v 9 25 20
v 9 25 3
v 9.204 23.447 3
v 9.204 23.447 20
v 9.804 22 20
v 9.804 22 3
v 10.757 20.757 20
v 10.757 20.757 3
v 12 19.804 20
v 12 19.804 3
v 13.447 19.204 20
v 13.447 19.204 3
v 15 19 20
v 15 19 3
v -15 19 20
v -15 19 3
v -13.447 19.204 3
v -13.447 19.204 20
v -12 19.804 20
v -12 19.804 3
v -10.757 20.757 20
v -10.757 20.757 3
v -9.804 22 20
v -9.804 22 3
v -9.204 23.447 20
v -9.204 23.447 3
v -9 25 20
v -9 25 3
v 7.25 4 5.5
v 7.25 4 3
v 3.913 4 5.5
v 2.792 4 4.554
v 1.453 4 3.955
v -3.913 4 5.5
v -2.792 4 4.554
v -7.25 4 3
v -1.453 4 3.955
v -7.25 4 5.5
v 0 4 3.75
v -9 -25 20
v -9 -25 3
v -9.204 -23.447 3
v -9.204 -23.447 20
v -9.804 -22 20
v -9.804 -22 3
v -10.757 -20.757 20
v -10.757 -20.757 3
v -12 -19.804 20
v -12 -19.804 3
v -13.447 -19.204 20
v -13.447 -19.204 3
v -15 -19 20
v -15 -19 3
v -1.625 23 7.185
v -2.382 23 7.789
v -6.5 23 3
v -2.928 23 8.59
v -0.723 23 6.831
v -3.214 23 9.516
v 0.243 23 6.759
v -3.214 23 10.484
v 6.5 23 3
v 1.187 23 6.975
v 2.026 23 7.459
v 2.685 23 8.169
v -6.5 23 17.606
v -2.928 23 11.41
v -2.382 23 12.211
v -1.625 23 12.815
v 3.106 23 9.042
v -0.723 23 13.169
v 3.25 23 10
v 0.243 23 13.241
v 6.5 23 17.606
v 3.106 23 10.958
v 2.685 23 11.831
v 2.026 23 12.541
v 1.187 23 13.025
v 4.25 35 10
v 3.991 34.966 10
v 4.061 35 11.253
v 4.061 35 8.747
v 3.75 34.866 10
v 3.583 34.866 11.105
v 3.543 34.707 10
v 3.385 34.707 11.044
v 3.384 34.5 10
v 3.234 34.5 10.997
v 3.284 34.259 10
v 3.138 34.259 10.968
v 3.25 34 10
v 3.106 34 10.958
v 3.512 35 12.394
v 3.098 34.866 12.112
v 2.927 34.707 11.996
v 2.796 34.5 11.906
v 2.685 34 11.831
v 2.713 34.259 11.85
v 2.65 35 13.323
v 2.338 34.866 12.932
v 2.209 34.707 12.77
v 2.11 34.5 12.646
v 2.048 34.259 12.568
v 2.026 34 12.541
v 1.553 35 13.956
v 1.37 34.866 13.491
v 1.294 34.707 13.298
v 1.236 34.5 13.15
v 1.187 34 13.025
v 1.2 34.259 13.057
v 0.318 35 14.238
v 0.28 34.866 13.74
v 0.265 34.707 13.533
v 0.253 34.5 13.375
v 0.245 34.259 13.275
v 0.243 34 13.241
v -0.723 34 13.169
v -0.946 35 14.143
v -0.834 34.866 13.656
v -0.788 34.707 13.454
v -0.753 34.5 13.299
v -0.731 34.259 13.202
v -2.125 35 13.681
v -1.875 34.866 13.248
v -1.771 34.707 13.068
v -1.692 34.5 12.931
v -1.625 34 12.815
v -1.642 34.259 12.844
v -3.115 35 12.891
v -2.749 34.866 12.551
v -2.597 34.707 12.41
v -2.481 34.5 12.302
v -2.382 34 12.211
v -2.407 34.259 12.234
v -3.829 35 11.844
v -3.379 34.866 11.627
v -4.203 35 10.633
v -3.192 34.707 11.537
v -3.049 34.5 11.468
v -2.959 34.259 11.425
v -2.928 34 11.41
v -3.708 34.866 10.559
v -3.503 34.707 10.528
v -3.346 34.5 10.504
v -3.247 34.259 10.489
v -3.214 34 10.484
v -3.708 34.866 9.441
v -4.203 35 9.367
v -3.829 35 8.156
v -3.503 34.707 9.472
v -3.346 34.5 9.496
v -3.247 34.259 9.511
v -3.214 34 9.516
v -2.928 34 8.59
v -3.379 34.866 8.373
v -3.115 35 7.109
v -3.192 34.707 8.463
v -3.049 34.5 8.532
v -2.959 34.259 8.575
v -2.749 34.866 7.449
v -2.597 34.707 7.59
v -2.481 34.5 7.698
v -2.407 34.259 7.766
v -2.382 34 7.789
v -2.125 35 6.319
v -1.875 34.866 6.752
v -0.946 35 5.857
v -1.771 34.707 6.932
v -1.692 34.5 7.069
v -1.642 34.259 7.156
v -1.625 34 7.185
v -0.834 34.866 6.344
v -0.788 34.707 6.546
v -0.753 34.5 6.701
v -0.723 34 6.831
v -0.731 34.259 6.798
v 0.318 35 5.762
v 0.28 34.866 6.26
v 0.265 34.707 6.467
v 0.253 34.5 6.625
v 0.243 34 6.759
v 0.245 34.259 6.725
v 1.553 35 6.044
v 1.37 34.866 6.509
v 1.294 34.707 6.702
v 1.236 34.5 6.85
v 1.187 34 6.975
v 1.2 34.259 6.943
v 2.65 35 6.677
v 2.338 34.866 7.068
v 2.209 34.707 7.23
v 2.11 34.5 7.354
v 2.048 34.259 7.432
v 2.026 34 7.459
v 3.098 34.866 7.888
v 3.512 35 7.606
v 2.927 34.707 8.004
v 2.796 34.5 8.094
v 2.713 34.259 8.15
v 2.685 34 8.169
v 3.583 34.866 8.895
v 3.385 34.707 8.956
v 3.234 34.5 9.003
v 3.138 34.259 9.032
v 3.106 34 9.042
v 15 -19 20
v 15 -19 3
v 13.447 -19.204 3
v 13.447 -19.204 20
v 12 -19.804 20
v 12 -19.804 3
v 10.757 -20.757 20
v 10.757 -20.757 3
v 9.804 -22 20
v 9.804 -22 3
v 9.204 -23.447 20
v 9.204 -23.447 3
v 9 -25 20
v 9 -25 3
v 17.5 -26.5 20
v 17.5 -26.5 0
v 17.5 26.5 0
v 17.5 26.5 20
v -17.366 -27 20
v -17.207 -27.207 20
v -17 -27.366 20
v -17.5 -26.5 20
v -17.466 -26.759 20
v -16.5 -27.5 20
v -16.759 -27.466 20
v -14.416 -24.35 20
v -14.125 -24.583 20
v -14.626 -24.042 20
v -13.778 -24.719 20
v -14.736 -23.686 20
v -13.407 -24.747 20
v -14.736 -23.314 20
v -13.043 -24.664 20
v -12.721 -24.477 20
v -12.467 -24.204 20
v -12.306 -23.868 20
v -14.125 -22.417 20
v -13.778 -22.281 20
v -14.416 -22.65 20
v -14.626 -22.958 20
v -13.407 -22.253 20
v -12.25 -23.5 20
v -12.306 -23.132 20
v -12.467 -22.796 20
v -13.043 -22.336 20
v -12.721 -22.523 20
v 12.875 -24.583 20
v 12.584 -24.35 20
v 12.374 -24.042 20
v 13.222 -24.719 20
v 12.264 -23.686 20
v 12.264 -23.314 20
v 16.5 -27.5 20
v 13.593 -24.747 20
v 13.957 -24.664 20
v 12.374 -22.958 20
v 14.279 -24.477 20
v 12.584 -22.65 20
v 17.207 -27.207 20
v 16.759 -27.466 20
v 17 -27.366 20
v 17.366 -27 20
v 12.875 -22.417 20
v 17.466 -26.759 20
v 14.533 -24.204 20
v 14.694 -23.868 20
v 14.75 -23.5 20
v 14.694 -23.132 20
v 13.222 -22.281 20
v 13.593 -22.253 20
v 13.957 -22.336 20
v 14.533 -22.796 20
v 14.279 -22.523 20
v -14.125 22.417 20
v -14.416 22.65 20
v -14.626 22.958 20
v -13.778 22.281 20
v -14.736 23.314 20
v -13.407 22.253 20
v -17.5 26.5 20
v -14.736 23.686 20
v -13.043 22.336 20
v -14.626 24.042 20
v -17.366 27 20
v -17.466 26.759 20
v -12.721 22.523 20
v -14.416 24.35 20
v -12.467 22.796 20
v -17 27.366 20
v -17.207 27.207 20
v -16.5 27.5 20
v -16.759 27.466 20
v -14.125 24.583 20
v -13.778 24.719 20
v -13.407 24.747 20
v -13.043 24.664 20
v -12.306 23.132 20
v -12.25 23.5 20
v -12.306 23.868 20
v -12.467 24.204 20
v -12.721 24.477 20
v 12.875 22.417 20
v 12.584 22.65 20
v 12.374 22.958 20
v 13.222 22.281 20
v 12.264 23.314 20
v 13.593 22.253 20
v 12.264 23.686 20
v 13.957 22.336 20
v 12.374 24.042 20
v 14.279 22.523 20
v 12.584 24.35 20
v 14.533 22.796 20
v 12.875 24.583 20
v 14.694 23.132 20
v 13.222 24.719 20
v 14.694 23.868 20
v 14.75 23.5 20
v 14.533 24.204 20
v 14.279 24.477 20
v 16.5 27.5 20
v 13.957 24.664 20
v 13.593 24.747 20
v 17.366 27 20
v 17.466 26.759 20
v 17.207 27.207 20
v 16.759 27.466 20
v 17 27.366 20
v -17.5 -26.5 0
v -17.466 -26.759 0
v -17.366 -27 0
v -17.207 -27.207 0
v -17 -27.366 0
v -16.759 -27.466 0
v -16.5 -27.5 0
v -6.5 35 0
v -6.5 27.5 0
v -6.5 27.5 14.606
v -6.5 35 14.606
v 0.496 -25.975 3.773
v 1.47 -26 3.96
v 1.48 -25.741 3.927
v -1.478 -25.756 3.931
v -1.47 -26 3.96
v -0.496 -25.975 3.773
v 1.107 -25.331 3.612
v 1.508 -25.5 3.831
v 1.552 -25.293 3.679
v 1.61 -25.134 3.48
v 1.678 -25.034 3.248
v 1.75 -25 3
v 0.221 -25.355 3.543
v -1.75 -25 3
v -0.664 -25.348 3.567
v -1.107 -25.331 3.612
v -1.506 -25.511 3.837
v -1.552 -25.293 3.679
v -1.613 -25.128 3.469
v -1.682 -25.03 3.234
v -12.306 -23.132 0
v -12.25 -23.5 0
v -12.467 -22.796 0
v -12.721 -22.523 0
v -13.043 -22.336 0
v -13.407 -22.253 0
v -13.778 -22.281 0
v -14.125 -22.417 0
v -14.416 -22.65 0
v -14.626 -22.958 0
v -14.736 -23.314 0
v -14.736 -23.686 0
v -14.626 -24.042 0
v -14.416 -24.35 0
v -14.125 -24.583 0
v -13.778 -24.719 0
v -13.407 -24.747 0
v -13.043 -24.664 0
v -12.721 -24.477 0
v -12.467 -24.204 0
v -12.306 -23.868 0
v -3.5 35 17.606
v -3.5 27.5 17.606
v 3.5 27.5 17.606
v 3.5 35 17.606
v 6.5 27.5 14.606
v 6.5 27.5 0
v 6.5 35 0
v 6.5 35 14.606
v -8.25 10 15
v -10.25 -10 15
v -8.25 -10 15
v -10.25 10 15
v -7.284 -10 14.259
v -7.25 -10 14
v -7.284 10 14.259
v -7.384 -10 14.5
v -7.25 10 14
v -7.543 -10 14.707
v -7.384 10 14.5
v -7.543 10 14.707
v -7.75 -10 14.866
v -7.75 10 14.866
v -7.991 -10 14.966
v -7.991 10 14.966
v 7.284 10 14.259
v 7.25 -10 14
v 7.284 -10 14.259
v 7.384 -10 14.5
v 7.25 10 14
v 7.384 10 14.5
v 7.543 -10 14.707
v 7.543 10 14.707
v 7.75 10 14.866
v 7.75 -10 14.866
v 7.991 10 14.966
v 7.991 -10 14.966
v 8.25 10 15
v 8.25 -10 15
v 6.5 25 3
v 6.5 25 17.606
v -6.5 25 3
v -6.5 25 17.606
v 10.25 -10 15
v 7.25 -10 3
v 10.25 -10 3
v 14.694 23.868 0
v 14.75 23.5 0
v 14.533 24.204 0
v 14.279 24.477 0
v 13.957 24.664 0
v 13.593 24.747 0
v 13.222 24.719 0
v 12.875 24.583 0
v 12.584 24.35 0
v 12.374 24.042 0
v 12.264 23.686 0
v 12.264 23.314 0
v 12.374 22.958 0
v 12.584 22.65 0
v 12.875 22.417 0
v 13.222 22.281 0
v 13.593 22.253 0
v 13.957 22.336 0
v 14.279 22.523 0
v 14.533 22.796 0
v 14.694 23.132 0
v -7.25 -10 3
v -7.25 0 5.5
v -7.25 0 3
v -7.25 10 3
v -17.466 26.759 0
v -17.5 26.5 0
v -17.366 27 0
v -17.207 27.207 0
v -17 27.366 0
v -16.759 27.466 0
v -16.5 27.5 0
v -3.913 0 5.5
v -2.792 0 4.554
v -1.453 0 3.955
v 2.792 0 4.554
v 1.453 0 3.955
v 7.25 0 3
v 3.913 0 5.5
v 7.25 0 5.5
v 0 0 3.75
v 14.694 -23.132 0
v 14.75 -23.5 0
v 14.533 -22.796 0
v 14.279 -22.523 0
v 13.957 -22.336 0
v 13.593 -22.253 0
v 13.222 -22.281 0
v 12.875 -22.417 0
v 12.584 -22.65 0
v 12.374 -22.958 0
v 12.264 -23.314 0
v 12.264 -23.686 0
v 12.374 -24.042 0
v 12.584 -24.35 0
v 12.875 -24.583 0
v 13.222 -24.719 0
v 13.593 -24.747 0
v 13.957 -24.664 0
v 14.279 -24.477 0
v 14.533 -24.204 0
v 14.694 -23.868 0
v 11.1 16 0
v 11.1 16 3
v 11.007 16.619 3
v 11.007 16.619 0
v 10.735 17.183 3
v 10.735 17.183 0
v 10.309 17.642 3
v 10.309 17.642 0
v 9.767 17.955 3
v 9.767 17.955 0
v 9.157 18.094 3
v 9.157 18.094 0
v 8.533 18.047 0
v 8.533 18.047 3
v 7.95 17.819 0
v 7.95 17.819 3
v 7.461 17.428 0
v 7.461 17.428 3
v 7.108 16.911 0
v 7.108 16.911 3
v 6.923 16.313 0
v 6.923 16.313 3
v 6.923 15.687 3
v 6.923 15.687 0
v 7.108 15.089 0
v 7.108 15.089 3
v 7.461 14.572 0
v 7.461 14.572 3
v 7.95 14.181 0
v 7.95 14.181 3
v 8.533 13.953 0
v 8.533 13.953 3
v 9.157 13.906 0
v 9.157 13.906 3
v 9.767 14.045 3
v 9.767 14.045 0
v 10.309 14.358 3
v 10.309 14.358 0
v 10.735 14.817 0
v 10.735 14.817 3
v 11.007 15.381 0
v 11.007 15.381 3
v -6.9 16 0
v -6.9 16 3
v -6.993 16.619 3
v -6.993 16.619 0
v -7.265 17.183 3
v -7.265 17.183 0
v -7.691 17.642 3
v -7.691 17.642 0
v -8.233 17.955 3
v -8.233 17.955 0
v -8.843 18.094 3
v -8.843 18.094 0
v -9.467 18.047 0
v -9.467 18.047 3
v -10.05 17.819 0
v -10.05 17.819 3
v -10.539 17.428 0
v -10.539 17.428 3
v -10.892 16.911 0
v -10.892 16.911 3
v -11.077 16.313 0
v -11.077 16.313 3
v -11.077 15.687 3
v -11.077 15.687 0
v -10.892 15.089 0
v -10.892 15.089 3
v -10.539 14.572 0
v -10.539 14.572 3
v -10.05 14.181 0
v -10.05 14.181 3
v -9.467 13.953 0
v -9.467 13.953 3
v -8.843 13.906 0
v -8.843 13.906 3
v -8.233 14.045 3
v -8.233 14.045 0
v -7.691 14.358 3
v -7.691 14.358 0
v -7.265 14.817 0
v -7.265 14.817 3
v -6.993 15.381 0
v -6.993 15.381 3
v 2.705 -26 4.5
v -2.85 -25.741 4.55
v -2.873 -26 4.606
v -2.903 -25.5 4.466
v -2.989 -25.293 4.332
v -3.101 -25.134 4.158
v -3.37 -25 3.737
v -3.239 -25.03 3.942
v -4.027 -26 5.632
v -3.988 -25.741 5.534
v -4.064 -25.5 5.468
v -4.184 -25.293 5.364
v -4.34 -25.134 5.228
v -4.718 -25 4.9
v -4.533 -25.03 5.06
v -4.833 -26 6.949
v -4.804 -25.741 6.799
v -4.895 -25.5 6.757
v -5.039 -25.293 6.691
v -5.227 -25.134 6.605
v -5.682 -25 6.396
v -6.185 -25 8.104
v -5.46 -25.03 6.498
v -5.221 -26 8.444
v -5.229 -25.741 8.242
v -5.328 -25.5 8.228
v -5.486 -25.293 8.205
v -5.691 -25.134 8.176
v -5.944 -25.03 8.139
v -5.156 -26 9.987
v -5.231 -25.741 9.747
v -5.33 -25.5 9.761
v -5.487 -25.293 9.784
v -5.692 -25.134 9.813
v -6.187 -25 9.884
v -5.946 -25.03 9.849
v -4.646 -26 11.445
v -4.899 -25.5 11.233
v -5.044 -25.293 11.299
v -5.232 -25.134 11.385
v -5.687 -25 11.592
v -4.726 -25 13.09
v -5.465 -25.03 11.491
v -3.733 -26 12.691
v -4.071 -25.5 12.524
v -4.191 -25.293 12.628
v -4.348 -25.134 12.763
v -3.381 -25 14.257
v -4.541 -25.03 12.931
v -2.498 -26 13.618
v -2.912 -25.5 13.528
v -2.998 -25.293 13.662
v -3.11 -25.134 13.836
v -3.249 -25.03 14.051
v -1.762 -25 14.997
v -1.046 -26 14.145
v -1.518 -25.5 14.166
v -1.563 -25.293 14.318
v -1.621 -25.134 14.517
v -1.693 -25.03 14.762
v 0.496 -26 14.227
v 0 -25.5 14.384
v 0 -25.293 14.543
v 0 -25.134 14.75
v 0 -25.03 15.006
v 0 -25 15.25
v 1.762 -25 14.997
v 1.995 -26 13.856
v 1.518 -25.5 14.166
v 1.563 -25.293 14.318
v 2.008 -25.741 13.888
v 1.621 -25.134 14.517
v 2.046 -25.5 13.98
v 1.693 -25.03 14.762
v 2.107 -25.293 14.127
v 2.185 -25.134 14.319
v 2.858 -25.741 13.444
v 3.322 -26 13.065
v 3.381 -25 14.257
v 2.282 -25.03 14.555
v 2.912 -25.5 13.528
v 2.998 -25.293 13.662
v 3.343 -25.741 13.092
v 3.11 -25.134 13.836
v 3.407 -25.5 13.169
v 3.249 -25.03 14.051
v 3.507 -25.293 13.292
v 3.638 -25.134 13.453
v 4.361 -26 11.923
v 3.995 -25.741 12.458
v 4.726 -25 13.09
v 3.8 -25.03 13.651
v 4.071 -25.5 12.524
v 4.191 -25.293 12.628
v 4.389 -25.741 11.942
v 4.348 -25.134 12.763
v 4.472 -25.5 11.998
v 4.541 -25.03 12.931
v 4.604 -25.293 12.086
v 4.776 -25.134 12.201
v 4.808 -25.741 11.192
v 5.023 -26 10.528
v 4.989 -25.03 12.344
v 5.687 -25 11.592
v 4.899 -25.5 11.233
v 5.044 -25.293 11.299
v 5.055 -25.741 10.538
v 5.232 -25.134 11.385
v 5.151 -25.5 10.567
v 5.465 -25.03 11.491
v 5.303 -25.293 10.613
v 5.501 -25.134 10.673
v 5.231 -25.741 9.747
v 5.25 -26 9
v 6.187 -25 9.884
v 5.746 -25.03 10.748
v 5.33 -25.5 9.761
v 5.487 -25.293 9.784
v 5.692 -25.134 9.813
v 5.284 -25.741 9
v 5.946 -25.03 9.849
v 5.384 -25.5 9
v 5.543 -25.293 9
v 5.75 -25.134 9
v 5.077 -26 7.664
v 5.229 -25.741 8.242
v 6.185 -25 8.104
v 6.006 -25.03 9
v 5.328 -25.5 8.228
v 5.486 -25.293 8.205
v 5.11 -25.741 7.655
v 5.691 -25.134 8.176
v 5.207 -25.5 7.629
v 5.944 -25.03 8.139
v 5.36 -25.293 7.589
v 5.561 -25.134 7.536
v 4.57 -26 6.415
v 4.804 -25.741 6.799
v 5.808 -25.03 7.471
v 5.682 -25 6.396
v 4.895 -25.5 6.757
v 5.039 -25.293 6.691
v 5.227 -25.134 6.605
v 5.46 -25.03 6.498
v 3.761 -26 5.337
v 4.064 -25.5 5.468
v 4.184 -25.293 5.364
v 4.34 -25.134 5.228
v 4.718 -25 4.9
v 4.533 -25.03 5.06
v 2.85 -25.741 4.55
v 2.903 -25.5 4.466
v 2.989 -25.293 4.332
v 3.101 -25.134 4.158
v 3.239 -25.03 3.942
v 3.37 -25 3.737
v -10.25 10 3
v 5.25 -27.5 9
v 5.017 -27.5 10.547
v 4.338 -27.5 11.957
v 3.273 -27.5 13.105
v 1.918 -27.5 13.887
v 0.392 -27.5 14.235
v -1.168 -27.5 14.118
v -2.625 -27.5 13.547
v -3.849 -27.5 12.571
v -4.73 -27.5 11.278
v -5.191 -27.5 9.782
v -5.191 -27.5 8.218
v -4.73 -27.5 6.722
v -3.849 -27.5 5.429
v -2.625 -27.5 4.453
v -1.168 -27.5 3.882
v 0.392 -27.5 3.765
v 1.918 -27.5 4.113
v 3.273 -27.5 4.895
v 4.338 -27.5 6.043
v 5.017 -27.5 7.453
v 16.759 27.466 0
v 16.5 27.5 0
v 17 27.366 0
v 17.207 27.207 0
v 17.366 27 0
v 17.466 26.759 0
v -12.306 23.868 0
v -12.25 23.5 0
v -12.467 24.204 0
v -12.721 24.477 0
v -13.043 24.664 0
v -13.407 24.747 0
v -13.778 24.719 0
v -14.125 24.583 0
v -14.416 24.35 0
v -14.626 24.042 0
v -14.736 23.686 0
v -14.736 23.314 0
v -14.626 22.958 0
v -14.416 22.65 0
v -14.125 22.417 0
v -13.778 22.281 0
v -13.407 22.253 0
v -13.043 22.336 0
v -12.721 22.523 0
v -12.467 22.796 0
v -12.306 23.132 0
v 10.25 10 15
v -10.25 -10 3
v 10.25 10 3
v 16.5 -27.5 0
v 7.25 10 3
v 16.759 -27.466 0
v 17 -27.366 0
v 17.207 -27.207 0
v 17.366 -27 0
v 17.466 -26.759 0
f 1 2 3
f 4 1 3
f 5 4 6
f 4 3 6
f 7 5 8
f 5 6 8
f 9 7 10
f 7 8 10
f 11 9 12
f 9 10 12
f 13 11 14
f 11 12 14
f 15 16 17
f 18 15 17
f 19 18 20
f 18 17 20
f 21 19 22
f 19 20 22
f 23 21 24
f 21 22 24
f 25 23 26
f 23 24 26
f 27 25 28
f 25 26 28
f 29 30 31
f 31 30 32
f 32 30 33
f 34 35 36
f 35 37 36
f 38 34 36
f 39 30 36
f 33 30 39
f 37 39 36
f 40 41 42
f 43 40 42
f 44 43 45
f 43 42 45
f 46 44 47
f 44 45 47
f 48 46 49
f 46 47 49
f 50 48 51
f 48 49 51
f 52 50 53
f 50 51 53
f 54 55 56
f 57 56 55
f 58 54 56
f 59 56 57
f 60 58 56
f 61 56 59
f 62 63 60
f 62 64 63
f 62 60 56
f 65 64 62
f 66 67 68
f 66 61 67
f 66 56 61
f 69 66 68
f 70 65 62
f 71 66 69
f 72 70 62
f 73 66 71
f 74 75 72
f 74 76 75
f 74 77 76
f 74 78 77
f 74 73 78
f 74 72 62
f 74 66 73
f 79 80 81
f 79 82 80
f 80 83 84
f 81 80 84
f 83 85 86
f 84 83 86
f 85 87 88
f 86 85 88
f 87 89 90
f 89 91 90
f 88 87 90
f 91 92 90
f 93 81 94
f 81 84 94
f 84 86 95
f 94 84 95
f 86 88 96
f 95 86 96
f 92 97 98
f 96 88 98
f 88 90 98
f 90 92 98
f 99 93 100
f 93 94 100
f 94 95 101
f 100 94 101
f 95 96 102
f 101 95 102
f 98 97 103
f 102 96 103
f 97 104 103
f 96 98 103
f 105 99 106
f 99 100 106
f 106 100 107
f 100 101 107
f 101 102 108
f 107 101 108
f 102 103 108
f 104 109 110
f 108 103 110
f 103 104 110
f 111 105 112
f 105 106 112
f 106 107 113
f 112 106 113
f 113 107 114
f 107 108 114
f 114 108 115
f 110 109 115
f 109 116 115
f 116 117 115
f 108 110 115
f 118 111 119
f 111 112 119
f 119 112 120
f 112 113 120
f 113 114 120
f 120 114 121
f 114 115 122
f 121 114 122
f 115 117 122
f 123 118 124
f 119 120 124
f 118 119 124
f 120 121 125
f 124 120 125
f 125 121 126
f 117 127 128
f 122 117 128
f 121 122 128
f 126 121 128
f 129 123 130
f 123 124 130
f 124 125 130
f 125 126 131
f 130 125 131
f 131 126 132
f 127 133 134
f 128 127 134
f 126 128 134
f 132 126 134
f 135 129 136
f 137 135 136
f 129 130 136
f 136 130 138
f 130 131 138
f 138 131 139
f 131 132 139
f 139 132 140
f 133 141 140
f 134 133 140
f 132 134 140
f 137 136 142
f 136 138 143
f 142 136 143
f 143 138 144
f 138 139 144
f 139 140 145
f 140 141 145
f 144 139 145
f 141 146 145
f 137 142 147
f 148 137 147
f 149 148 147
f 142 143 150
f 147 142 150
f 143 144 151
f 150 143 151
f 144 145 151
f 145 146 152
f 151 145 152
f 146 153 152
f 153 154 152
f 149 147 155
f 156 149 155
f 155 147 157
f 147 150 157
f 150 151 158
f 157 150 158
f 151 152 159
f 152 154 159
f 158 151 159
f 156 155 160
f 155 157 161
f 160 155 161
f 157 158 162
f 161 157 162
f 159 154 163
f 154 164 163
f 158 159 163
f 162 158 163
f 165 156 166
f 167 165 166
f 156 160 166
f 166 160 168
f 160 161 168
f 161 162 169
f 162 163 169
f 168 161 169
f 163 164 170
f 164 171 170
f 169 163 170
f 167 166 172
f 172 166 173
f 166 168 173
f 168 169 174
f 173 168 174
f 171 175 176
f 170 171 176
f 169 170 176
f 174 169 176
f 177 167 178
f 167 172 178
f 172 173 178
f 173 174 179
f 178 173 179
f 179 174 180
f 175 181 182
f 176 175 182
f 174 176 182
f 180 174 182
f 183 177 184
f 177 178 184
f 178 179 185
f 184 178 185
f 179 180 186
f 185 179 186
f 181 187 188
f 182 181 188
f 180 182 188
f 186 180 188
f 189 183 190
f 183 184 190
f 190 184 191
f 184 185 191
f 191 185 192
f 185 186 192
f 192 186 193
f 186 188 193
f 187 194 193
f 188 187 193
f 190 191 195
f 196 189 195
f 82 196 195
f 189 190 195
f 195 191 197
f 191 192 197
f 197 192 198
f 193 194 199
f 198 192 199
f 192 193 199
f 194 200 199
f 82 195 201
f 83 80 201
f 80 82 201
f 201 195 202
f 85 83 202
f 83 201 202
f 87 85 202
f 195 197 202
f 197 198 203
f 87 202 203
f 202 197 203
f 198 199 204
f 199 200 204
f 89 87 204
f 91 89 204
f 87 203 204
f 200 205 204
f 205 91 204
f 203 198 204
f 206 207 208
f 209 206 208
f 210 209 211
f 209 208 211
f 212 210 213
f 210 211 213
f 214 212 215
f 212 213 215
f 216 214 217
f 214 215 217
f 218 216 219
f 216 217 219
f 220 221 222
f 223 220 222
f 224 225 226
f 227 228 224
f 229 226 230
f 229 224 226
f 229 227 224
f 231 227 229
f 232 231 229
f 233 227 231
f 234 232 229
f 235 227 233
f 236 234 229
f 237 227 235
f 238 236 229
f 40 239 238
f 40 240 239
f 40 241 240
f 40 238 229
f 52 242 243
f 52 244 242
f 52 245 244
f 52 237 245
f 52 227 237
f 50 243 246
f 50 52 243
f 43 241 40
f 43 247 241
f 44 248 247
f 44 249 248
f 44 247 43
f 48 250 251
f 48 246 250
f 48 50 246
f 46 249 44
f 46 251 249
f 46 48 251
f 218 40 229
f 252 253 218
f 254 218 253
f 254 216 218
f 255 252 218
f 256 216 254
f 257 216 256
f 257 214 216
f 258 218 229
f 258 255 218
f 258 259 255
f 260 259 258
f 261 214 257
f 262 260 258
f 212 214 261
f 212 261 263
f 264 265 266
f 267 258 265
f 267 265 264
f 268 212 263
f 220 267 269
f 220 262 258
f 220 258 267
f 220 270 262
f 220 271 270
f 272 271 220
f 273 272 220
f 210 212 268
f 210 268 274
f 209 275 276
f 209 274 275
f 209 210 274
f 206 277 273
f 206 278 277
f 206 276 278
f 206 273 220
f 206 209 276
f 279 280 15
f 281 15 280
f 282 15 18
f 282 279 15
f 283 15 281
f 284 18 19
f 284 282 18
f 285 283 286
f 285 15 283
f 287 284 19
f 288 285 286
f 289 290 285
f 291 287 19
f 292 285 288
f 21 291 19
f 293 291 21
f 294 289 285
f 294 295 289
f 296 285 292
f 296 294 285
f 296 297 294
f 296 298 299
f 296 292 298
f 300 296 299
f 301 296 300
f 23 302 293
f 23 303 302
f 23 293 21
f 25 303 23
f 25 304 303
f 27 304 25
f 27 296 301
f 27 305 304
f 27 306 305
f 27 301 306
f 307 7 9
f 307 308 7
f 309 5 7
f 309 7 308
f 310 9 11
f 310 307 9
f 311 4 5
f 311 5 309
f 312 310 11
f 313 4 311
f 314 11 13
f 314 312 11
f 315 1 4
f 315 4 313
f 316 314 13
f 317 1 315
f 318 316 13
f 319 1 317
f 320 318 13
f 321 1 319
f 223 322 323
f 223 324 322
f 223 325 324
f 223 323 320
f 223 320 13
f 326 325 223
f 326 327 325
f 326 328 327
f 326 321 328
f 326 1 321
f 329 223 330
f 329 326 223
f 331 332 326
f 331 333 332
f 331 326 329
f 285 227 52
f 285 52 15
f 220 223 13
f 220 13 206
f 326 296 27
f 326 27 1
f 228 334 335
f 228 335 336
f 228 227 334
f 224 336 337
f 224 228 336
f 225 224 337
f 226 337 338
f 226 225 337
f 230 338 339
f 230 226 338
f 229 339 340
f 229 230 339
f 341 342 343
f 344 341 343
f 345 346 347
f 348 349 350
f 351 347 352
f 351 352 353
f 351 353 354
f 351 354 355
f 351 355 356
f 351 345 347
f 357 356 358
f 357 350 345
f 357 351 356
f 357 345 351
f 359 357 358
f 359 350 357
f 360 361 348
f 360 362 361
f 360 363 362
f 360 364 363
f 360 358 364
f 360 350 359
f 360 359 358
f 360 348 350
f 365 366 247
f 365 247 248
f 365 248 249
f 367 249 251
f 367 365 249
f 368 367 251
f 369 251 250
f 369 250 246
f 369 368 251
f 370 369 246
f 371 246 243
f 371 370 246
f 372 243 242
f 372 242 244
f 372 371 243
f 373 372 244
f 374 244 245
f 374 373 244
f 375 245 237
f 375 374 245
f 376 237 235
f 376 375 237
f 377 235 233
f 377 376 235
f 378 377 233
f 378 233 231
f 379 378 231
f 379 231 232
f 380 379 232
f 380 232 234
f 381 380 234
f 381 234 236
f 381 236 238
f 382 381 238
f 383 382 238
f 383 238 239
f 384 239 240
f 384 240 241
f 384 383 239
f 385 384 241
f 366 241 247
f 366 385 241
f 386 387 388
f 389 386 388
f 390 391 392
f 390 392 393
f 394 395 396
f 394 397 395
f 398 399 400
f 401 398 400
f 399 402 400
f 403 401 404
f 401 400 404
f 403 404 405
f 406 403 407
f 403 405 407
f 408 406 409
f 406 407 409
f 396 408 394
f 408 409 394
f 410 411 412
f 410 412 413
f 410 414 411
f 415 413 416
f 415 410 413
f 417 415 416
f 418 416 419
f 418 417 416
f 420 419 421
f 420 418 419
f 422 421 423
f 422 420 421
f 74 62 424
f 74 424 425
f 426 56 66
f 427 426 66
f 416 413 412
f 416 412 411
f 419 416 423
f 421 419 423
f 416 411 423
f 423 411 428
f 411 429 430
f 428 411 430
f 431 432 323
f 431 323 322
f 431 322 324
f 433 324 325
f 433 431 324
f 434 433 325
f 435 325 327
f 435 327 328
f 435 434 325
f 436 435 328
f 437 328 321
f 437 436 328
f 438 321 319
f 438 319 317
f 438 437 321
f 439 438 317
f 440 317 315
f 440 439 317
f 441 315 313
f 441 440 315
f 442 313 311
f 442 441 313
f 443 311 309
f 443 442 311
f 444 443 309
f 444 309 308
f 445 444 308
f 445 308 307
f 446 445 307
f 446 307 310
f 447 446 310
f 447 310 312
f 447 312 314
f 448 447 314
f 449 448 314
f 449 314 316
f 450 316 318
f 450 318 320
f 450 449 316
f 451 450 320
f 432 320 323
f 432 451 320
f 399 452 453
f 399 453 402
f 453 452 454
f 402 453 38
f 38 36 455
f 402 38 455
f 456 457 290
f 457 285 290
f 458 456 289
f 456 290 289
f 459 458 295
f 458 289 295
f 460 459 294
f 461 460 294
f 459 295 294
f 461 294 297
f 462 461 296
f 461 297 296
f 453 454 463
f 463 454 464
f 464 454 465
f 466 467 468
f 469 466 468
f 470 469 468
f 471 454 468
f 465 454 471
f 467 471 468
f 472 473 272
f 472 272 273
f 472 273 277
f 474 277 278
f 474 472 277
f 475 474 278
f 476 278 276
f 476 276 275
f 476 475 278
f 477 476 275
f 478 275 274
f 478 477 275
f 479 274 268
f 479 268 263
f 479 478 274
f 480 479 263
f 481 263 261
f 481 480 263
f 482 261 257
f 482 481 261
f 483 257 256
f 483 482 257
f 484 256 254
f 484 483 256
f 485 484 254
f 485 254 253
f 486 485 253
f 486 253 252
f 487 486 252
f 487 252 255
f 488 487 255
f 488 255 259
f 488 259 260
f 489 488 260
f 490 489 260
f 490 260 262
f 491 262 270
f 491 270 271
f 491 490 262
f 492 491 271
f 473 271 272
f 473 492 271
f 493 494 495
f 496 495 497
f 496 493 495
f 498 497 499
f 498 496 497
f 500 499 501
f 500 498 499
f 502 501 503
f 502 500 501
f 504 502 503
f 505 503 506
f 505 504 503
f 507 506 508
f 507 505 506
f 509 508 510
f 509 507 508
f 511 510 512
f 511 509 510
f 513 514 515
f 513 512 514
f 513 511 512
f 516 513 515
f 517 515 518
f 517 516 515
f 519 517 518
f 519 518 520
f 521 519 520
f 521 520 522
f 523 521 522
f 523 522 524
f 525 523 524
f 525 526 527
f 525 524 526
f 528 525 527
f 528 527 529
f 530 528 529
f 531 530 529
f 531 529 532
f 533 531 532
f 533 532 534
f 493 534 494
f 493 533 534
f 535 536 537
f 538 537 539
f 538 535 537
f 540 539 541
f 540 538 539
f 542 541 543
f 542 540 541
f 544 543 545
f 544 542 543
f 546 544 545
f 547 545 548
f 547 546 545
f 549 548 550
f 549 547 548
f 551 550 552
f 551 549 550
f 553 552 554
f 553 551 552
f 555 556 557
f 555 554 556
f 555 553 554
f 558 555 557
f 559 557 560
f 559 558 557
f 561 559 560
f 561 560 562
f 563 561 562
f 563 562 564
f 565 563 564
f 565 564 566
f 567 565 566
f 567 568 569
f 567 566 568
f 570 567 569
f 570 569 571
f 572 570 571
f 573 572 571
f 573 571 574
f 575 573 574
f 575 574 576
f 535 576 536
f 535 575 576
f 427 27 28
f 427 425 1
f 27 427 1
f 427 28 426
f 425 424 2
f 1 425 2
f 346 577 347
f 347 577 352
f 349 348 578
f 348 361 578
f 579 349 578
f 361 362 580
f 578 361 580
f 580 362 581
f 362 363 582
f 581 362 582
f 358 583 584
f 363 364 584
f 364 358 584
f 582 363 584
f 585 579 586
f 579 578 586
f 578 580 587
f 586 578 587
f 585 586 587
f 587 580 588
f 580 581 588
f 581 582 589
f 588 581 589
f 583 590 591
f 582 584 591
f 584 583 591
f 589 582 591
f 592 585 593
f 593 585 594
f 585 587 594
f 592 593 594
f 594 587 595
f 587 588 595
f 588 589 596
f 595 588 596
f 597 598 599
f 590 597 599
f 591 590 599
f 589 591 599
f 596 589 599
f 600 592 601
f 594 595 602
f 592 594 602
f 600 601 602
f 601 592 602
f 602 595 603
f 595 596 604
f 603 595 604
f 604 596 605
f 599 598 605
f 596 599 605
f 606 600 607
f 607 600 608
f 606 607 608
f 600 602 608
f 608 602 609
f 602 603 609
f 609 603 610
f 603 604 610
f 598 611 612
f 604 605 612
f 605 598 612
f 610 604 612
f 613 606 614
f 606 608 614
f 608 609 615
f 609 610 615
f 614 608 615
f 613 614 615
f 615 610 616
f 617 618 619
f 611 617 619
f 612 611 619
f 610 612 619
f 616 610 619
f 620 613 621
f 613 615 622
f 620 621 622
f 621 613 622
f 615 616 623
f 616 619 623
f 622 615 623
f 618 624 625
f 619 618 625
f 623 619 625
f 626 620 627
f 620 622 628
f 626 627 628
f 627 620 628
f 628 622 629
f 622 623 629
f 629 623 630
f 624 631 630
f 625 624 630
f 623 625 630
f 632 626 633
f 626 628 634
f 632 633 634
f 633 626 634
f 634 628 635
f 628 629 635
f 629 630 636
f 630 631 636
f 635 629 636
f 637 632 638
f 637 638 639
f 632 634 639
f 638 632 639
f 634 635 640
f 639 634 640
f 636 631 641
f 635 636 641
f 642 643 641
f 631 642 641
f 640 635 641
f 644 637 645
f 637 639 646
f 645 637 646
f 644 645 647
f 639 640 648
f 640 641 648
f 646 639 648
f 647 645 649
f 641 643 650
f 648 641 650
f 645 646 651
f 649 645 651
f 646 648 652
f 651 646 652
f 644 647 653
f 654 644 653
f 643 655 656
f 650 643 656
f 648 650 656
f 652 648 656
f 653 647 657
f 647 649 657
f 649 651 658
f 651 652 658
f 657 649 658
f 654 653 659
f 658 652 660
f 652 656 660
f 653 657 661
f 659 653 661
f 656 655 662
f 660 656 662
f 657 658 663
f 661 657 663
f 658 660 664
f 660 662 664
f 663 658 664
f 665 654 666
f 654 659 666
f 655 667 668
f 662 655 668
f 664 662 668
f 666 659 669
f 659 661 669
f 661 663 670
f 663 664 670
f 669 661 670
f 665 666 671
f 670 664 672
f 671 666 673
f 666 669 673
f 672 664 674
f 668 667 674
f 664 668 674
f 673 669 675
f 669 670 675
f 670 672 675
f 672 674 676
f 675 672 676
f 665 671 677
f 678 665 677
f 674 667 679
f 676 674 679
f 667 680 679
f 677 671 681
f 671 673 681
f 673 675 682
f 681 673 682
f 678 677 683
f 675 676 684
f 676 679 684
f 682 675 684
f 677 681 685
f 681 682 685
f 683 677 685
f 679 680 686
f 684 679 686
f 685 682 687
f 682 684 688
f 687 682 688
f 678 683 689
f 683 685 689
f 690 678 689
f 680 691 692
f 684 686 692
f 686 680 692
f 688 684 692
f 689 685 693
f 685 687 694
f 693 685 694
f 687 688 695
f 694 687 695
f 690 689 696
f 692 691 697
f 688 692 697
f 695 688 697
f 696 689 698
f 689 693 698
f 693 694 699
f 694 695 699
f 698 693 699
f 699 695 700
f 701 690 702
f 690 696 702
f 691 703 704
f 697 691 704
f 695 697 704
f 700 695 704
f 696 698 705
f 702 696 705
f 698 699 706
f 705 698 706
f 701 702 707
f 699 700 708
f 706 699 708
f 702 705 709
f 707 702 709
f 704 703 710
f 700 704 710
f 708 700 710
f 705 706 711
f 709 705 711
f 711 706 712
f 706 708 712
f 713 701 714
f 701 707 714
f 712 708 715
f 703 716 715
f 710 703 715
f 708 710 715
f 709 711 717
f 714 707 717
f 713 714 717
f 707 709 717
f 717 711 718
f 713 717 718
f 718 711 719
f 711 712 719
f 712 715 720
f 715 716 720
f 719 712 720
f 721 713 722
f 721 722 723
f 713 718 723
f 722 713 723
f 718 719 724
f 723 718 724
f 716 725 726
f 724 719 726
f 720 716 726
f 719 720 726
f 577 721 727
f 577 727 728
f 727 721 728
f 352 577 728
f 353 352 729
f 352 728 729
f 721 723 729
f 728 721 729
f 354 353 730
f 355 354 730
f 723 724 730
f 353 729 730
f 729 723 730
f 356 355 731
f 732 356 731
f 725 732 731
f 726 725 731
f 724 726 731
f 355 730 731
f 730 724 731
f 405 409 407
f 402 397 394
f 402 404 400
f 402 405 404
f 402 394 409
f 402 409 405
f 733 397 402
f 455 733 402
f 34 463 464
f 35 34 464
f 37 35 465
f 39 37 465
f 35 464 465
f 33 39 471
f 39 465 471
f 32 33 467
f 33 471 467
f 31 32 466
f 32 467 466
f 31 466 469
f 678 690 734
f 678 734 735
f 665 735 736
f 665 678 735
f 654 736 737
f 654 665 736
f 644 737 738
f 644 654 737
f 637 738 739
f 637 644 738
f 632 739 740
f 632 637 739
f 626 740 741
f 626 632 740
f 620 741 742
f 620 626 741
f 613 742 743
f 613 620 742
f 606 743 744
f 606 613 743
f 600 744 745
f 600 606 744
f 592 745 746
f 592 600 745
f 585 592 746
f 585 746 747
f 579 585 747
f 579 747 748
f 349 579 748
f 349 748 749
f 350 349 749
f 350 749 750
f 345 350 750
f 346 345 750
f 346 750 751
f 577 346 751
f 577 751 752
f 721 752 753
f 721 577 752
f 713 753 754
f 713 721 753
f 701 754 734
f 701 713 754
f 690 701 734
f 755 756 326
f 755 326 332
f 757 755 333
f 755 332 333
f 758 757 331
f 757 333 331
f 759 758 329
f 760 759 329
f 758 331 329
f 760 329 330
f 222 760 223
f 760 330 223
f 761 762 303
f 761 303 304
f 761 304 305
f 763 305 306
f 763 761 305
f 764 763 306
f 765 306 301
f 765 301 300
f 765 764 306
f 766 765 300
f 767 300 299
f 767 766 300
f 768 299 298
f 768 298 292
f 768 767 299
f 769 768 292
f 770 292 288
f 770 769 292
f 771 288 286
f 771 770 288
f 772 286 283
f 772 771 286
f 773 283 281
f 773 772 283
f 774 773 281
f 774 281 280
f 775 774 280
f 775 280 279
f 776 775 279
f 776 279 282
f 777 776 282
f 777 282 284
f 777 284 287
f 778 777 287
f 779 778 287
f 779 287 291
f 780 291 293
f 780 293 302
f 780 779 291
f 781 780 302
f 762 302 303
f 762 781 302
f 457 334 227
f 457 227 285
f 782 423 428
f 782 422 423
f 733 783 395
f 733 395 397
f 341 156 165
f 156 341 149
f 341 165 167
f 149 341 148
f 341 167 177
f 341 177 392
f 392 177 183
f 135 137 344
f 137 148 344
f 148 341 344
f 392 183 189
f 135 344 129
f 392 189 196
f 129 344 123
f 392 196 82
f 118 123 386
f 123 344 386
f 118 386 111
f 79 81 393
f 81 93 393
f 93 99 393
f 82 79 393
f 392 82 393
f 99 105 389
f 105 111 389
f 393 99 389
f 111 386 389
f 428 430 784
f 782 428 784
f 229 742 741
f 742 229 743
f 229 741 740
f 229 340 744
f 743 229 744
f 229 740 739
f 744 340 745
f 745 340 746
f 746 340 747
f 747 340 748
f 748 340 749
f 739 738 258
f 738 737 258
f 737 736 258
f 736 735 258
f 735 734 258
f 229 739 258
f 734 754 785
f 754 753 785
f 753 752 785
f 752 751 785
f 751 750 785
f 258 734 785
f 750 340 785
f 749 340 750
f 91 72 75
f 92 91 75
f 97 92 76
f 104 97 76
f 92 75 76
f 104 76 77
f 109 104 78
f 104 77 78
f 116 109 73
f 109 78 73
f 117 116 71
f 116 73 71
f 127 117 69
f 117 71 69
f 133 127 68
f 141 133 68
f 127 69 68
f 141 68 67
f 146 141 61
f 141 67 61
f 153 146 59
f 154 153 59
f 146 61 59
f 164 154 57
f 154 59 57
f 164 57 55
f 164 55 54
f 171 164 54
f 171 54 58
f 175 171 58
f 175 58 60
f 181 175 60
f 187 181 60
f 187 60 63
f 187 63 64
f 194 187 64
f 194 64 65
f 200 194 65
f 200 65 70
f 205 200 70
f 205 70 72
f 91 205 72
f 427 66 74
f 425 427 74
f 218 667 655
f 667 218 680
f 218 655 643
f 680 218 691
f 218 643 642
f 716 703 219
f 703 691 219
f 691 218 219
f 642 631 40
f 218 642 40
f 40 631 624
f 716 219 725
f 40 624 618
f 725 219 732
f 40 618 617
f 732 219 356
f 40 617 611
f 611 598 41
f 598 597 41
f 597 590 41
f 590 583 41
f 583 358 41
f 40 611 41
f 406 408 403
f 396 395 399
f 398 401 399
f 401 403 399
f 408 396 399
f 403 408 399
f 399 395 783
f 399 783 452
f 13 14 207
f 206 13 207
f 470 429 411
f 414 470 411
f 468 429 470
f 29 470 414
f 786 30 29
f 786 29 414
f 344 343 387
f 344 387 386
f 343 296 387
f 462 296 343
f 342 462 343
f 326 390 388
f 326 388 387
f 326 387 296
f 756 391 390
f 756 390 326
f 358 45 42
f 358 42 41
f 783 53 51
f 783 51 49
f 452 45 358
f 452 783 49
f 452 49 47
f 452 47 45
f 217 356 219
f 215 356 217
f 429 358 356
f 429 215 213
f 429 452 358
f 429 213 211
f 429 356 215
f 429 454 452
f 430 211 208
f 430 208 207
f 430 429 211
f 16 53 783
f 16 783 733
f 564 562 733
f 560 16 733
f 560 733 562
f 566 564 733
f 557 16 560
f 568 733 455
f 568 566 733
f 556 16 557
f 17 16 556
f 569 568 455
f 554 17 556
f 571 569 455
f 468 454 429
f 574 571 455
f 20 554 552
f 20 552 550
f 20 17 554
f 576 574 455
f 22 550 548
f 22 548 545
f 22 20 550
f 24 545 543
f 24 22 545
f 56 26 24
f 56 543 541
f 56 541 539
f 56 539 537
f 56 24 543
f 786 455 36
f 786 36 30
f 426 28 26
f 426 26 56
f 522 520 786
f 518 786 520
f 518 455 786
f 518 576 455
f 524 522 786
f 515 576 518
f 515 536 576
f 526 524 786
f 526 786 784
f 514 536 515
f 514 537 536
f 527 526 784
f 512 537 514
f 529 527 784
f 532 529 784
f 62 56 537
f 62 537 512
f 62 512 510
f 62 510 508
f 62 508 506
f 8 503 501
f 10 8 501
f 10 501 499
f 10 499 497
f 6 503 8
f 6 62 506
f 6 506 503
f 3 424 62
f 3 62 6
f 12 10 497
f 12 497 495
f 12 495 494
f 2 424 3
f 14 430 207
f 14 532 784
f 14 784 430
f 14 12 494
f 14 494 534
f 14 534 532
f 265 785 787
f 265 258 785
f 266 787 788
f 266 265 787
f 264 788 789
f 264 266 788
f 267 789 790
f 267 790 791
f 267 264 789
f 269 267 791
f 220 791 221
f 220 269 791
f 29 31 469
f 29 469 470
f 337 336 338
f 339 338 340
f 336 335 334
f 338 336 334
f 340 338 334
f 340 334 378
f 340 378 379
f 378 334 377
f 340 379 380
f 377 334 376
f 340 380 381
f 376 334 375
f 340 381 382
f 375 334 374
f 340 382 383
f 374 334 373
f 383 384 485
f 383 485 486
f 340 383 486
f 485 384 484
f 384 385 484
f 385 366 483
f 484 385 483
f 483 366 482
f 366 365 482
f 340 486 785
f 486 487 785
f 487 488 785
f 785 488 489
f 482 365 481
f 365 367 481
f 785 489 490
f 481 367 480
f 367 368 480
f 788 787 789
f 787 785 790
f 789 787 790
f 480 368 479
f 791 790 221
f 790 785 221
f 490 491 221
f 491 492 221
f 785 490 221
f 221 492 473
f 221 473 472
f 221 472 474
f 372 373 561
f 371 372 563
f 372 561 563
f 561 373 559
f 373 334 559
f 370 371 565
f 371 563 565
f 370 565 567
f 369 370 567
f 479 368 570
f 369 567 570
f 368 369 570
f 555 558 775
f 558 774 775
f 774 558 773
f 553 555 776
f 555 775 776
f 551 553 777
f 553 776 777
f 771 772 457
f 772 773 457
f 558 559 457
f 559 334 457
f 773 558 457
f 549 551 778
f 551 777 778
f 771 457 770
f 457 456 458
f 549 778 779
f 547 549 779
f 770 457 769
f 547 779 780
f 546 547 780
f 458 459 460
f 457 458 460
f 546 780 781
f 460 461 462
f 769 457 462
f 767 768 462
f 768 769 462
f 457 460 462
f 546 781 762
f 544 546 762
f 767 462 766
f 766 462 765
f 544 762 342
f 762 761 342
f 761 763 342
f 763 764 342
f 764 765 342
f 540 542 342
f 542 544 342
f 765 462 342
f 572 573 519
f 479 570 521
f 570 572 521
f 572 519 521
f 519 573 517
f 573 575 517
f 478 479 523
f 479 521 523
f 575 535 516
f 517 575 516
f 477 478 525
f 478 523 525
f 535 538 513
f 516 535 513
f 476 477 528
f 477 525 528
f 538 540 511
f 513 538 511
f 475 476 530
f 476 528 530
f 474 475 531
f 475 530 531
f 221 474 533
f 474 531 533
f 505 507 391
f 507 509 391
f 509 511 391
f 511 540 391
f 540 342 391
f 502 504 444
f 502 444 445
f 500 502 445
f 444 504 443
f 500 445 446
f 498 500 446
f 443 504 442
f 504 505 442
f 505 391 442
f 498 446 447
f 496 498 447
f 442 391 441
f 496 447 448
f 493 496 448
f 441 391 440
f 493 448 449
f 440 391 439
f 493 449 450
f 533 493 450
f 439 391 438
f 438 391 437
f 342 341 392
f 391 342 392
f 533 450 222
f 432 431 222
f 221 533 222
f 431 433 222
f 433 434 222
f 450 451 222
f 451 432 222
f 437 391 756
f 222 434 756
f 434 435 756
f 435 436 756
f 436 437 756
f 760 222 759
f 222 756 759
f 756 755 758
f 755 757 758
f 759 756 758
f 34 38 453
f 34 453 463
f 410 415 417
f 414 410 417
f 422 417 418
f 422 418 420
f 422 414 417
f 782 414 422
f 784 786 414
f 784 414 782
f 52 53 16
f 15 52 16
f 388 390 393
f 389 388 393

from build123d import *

# Parameters (mm, degrees)
F0_W           = 35
F0_H           = 55
F0_R           = 1.25
F1_DEPTH       = 20
F2_DEPTH       = 3
F3_R           = 1
F4_W           = 3
F4_H           = 20
F5_DEPTH       = 15
F7_DEPTH       = 5.5
F8_R           = 2.1
F9_DEPTH       = 25
F9_DEPTH_BACK  = 25
F10_R          = 5.25
F11_DEPTH      = 25
F11_DEPTH_BACK = 30
F13_START      = -23
F12_W          = 13
F12_H          = 17.6061931998
F12_R          = 3.25
F13_DEPTH      = 12
F14_DEPTH      = 25
F14_DEPTH_BACK = 25
F15_SIZE       = 3
F16_R          = 1


with BuildPart() as f1:
    # F0 (on Top) → F1 (new body)
    with BuildSketch(Plane.XY):
        Rectangle(F0_W, F0_H)
        with Locations((-13.5, -23.5)):
            Circle(F0_R, mode=Mode.SUBTRACT)
        with Locations((13.5, -23.5)):
            Circle(F0_R, mode=Mode.SUBTRACT)
        with Locations((-13.5, 23.5)):
            Circle(F0_R, mode=Mode.SUBTRACT)
        with BuildLine():
            ThreePointArc((15, -19), (10.7573593129, -20.7573593129), (9, -25))
            Line((9, -25), (-9, -25))
            ThreePointArc((-9, -25), (-10.7573593129, -20.7573593129), (-15, -19))
            Line((-15, -19), (-15, 19))
            ThreePointArc((-15, 19), (-10.7573593129, 20.7573593129), (-9, 25))
            Line((-9, 25), (9, 25))
            ThreePointArc((9, 25), (10.7573593129, 20.7573593129), (15, 19))
            Line((15, 19), (15, -19))
        make_face(mode=Mode.SUBTRACT)
        with Locations((13.5, 23.5)):
            Circle(F0_R, mode=Mode.SUBTRACT)
    extrude(amount=F1_DEPTH)

    # F0 (on Top) → F2 (join)
    with BuildSketch(Plane.XY):
        with BuildLine():
            Line((-9, -25), (9, -25))
            ThreePointArc((9, -25), (10.7573593129, -20.7573593129), (15, -19))
            Line((15, -19), (15, 19))
            ThreePointArc((15, 19), (10.7573593129, 20.7573593129), (9, 25))
            Line((9, 25), (-9, 25))
            ThreePointArc((-9, 25), (-10.7573593129, 20.7573593129), (-15, 19))
            Line((-15, 19), (-15, -19))
            ThreePointArc((-15, -19), (-10.7573593129, -20.7573593129), (-9, -25))
        make_face()
    extrude(amount=F2_DEPTH)

    # F3
    f3_edges = [f1.edges().sort_by_distance(p)[0] for p in [
        (17.5, 27.5, 10),
        (-17.5, 27.5, 10),
        (17.5, -27.5, 10),
        (-17.5, -27.5, 10),
    ]]
    fillet(f3_edges, radius=F3_R)

    # F4 (on Top) → F5 (join)
    with BuildSketch(Plane.XY):
        with Locations((-8.75, 0)):
            Rectangle(F4_W, F4_H)
        with Locations((8.75, 0)):
            Rectangle(F4_W, F4_H)
    extrude(amount=F5_DEPTH)

    # F6 (on Top) → F7 (join)
    with BuildSketch(Plane.XY):
        Polygon((-9, 0), (0, 0), (9, 0), (9, 4), (-9, 4), align=None)
    extrude(amount=F7_DEPTH)

    # F8 (on Top) → F9 (cut, two sides)
    with BuildSketch(Plane.XY) as f9_sk:
        with Locations((-9, 16)):
            Circle(F8_R)
        with Locations((9, 16)):
            Circle(F8_R)
    extrude(amount=-F9_DEPTH, mode=Mode.SUBTRACT)
    extrude(f9_sk.sketch, amount=F9_DEPTH_BACK, mode=Mode.SUBTRACT)

    # F10 (on Front) → F11 (cut, two sides)
    with BuildSketch(Plane.XZ) as f11_sk:
        with Locations((0, 9)):
            Circle(F10_R)
    extrude(amount=-F11_DEPTH, mode=Mode.SUBTRACT)
    extrude(f11_sk.sketch, amount=F11_DEPTH_BACK, mode=Mode.SUBTRACT)

    # F12 (on Front) → F13 (join)
    with BuildSketch(Plane.XZ.offset(F13_START)):
        with Locations((0, 8.8030965999)):
            Rectangle(F12_W, F12_H)
        with Locations((0, 10)):
            Circle(F12_R, mode=Mode.SUBTRACT)
    extrude(amount=-F13_DEPTH)

    # F14 (cut, two sides): a face of the model
    f14_faces = [f1.faces().sort_by_distance(p)[0] for p in [
        (0, 27.5, 10),
    ]]
    extrude(f14_faces, amount=-F14_DEPTH, mode=Mode.SUBTRACT)
    extrude(f14_faces, amount=F14_DEPTH_BACK, mode=Mode.SUBTRACT)

    # F15
    f15_edges = [f1.edges().sort_by_distance(p)[0] for p in [
        (6.5, 31.25, 17.606193),
        (-6.5, 31.25, 17.606193),
    ]]
    chamfer(f15_edges, length=F15_SIZE)

    # F16
    f16_edges = [f1.edges().sort_by_distance(p)[0] for p in [
        (-3.25, 35, 10),
        (-5.25, -25, 9),
        (-7.25, 0, 15),
        (7.25, 0, 15),
    ]]
    fillet(f16_edges, radius=F16_R)


solid = f1.part
